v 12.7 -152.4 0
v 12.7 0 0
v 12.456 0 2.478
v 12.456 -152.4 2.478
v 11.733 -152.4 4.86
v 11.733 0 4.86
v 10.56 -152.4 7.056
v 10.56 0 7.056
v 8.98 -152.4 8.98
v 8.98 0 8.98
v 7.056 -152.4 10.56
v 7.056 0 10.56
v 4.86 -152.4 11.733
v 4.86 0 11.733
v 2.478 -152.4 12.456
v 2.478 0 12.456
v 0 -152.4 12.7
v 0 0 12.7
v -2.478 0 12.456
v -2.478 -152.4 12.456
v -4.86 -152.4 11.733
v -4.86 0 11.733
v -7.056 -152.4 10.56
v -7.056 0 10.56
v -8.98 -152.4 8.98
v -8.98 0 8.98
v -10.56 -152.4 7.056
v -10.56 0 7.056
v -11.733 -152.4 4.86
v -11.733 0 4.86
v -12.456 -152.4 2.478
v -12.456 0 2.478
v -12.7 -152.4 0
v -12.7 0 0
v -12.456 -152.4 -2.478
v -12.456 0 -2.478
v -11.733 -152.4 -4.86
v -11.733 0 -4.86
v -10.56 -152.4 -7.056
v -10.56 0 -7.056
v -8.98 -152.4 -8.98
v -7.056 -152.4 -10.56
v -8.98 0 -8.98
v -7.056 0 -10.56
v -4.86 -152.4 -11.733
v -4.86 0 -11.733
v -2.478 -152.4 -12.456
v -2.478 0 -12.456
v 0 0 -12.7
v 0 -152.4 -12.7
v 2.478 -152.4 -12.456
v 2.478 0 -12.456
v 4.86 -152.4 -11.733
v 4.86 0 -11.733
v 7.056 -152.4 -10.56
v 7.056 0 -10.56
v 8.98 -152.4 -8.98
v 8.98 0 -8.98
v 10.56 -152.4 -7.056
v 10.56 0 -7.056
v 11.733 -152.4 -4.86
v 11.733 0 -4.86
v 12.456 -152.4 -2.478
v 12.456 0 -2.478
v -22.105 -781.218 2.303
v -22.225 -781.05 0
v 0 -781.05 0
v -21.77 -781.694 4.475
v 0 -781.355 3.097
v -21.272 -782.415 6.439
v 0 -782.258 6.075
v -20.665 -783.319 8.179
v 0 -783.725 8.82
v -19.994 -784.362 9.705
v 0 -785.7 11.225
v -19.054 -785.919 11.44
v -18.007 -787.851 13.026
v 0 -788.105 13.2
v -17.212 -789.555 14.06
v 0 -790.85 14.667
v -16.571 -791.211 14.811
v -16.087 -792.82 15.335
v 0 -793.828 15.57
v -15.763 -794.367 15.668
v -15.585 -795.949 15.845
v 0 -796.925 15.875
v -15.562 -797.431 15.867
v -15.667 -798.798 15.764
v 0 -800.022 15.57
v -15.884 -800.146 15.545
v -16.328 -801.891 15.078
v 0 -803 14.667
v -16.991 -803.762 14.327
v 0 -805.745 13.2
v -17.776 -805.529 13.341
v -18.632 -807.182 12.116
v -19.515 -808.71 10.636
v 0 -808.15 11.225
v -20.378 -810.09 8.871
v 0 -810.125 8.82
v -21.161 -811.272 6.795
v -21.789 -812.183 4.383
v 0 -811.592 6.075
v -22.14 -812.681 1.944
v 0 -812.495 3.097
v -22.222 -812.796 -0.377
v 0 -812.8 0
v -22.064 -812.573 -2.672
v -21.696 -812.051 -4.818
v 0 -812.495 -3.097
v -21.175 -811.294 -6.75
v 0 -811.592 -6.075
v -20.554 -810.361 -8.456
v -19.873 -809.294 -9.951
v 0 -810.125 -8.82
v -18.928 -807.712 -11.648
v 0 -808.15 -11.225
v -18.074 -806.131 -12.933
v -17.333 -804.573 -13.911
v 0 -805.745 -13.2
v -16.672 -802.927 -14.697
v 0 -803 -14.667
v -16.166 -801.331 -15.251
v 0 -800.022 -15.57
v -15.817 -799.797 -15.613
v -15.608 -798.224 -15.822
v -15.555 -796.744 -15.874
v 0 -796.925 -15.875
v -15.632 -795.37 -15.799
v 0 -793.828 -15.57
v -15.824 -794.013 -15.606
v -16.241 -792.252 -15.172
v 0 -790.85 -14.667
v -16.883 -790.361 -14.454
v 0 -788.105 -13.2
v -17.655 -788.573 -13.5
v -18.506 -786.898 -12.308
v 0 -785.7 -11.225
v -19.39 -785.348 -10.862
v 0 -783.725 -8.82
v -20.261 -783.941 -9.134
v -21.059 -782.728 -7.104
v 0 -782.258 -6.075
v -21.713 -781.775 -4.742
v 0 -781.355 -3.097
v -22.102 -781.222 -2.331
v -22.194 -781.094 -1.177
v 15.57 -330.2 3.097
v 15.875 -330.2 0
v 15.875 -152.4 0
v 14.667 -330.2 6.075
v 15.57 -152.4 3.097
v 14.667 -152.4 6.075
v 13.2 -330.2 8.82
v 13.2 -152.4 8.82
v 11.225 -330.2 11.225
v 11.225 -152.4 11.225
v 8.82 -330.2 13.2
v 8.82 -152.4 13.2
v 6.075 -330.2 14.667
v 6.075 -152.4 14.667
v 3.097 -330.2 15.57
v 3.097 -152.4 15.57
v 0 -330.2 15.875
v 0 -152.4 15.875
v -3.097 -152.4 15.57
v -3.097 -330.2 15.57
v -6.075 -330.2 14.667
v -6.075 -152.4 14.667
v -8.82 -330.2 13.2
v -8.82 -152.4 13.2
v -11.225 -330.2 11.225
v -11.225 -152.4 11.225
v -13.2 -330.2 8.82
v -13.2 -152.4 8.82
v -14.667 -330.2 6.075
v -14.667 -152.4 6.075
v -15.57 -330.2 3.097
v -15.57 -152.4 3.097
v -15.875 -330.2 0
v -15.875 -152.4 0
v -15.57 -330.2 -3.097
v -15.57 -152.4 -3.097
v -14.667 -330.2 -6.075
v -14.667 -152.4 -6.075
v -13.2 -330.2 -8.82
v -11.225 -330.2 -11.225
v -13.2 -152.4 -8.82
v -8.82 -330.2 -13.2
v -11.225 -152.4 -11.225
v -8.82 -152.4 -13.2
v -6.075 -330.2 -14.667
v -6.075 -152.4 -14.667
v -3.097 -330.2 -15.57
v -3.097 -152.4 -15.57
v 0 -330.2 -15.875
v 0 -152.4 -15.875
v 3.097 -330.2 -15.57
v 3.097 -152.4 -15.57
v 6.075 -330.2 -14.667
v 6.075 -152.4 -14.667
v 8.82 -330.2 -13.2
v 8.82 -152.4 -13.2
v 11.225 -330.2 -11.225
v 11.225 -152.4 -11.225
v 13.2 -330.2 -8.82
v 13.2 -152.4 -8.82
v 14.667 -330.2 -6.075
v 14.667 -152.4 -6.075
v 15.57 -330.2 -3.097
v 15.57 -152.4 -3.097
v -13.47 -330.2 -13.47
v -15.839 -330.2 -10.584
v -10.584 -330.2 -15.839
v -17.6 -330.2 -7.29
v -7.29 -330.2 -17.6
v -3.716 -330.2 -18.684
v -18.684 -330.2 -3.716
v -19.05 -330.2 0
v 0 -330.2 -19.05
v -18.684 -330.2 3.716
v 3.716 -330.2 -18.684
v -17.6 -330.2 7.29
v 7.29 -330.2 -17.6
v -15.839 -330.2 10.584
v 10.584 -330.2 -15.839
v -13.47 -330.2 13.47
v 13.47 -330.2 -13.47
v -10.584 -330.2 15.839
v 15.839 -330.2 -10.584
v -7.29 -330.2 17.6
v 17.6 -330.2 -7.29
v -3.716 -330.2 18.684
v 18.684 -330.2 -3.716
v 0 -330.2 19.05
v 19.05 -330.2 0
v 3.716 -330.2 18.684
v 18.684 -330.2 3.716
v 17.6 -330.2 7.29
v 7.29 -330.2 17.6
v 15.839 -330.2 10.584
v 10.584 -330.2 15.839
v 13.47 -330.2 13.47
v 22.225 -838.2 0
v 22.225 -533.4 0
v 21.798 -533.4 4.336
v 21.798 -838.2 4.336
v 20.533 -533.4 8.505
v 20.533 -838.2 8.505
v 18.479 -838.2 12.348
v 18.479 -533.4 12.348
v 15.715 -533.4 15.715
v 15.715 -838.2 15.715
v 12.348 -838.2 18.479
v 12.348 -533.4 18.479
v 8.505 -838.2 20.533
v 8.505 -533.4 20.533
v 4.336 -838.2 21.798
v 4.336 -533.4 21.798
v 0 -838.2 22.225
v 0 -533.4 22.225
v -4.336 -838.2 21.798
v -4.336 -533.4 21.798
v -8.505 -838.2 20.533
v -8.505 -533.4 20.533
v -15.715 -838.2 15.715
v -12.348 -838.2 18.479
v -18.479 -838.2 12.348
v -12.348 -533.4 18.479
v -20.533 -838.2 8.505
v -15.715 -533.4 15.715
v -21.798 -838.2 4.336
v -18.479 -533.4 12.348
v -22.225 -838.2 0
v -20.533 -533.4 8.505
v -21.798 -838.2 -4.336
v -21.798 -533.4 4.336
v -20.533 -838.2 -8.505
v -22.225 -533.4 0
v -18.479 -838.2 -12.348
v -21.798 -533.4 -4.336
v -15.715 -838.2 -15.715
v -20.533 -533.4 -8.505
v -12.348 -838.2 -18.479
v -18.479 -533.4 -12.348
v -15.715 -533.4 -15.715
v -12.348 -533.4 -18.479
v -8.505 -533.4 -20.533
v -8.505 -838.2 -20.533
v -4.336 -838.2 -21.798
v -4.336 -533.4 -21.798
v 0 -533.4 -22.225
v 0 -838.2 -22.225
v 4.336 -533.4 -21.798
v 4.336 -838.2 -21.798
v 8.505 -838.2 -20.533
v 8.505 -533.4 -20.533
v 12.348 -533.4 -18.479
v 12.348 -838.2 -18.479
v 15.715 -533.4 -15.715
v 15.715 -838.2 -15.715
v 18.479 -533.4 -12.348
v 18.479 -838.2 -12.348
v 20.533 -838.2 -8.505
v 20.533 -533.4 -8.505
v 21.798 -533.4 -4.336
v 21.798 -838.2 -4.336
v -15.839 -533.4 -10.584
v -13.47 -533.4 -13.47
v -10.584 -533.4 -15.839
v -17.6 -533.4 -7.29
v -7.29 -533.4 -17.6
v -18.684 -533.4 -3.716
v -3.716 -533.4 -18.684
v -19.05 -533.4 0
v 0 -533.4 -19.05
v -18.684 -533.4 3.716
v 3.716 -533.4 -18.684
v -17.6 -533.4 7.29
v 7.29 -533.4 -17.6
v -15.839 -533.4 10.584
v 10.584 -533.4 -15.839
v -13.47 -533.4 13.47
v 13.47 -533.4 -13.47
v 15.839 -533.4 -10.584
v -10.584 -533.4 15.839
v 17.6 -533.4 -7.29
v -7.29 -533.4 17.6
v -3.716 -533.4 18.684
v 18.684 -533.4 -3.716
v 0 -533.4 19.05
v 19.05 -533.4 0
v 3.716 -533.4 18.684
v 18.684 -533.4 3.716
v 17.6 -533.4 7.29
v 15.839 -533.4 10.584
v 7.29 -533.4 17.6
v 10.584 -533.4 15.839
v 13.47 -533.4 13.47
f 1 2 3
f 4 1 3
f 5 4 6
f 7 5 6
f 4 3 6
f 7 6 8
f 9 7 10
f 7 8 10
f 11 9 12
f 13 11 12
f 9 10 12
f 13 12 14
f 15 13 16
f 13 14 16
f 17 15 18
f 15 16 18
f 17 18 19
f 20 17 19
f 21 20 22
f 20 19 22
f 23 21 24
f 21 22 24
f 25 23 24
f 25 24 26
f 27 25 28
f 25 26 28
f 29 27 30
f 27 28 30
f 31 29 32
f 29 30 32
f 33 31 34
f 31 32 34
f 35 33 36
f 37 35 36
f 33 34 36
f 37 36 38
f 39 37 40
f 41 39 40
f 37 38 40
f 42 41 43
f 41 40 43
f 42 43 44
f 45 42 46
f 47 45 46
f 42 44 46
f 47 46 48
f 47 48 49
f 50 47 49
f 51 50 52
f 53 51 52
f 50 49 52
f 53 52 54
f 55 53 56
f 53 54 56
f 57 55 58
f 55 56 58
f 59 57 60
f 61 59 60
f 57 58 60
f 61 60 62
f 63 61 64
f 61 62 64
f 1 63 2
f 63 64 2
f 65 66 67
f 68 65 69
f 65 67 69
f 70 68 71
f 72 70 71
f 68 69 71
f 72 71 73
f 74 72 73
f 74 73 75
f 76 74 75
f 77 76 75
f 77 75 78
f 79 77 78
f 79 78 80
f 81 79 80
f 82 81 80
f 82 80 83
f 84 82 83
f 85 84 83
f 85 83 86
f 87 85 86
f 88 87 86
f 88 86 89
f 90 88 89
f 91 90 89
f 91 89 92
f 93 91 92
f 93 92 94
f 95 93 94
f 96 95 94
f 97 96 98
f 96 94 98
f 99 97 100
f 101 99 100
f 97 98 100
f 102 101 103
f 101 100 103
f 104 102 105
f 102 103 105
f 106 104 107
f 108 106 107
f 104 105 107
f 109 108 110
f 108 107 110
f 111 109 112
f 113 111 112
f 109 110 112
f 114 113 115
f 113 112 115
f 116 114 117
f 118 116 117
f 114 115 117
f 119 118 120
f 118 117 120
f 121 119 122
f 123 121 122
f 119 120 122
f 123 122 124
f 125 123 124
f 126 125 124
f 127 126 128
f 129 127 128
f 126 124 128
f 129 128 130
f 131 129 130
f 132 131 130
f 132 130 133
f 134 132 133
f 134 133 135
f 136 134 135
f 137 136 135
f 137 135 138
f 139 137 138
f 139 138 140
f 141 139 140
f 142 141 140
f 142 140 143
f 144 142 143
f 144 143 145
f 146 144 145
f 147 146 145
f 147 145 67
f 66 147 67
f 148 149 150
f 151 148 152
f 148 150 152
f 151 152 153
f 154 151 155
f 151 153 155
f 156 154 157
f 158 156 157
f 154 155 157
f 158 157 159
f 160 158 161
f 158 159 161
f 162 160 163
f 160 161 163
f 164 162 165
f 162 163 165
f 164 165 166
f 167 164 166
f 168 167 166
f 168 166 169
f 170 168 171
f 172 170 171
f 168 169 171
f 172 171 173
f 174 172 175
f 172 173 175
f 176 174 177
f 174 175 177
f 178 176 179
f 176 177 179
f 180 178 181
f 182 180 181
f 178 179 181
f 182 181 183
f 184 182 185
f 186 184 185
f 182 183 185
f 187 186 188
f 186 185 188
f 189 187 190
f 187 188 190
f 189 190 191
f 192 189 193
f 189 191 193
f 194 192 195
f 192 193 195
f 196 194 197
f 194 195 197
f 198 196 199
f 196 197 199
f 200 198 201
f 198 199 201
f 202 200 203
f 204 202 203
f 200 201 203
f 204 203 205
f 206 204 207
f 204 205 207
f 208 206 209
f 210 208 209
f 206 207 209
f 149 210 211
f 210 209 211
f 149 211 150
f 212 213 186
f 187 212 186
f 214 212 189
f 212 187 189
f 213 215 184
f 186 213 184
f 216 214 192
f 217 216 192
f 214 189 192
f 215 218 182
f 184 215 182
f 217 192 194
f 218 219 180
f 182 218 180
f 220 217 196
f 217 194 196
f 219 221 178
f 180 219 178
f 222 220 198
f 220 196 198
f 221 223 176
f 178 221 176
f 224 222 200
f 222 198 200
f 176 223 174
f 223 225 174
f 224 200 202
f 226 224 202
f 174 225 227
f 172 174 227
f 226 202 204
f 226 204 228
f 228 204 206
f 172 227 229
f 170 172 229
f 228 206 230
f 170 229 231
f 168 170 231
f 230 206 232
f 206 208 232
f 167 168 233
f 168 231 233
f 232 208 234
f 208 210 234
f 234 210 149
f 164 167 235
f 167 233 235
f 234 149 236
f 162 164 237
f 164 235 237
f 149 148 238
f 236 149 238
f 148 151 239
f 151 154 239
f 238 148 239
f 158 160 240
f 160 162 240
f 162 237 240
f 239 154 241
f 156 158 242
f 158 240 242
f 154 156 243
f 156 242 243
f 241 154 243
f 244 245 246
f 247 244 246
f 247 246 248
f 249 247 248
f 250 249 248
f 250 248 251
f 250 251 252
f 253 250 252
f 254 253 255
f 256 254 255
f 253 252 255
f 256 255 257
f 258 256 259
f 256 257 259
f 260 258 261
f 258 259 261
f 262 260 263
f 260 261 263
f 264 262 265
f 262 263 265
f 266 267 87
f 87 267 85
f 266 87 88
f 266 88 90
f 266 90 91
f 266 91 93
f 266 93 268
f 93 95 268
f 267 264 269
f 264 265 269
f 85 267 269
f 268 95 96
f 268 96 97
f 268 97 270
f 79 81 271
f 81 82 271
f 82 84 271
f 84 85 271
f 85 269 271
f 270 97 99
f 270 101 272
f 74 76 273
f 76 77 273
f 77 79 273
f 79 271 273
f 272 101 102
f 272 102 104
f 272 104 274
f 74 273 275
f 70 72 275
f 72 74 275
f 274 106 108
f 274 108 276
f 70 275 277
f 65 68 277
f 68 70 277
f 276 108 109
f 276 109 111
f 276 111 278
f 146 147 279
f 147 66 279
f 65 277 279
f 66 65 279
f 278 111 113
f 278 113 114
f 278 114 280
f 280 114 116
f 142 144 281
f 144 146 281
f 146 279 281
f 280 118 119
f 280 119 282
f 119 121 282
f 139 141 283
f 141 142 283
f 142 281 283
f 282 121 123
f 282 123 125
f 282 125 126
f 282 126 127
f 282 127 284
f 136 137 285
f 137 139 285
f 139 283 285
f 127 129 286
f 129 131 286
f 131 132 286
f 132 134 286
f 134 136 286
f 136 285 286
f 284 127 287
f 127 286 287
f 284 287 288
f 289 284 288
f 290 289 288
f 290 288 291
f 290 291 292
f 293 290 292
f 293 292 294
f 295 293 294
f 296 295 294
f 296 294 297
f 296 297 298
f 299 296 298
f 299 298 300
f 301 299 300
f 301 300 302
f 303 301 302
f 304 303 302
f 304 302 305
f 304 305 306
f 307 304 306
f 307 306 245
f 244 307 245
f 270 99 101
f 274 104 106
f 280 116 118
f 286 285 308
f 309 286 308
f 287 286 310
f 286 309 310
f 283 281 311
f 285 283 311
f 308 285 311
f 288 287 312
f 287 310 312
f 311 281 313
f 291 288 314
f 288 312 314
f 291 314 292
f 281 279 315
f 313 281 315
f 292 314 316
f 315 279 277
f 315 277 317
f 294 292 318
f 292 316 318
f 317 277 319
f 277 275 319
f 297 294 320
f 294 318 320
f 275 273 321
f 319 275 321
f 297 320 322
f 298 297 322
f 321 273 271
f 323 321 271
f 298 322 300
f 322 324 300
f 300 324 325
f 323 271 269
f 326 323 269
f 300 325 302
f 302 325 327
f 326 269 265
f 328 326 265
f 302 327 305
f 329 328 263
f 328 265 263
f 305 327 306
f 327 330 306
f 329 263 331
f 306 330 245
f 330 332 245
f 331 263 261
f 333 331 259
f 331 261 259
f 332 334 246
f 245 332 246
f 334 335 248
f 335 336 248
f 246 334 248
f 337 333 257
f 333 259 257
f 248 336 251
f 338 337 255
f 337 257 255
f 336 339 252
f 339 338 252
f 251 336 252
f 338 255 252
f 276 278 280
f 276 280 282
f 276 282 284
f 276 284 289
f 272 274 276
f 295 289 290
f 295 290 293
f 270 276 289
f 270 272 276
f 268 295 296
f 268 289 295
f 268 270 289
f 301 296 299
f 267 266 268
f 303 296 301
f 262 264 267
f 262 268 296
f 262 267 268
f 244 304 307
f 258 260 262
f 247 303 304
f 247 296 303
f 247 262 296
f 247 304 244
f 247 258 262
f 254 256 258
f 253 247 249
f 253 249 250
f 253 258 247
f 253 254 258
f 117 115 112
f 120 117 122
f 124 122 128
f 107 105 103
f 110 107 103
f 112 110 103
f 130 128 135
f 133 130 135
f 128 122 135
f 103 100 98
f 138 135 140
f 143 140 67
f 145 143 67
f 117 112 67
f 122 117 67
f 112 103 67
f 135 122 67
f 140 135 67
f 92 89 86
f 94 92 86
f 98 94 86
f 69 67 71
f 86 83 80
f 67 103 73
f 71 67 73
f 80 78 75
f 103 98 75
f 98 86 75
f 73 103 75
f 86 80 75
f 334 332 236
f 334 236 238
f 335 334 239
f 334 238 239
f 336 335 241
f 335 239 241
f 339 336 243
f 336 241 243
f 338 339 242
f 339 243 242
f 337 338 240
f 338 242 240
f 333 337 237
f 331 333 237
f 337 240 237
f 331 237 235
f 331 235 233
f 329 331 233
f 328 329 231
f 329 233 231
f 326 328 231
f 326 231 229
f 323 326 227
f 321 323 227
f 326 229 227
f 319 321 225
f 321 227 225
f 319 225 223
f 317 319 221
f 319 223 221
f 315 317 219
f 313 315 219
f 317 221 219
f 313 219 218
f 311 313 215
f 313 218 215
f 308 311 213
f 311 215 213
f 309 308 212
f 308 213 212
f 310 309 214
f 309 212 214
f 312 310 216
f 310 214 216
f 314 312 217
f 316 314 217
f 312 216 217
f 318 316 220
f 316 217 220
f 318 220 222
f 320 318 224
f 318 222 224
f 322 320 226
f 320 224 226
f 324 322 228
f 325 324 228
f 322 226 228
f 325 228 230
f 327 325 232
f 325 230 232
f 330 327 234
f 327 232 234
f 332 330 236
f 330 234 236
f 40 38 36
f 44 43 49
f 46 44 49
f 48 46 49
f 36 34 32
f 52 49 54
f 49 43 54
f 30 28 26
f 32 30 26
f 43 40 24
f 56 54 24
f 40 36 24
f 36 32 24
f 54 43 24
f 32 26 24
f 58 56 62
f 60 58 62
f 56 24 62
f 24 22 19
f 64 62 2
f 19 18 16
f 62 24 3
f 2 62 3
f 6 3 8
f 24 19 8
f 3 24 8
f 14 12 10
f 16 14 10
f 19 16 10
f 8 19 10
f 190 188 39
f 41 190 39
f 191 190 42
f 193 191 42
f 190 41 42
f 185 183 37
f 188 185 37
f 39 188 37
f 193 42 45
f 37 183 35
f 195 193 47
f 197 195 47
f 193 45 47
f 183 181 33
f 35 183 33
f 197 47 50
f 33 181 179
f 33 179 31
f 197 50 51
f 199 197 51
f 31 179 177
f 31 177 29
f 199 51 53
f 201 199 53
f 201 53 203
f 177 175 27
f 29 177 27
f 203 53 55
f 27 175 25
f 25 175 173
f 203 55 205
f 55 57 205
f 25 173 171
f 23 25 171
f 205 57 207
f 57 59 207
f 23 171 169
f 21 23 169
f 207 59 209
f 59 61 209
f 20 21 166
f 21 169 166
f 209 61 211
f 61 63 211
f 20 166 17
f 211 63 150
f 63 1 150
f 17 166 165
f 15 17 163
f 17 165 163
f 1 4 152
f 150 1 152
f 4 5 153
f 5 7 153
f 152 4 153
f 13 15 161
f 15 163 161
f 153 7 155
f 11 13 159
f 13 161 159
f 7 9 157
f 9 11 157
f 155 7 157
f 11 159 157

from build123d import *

# Parameters (mm, degrees)
F0_R     = 12.7
F1_DEPTH = 152.4
F2_R     = 15.875
F2_R_2   = 12.7
F3_DEPTH = 177.8
F4_R     = 19.05
F4_R_2   = 15.875
F5_DEPTH = 203.2
F6_R     = 22.225
F6_R_2   = 19.05
F7_DEPTH = 304.8
F8_R     = 15.875
F9_DEPTH = 25.4


with BuildPart() as f1:
    # F0 (on Front) → F1 (new body)
    with BuildSketch(Plane.XZ):
        Circle(F0_R)
    extrude(amount=F1_DEPTH)

    # F2 (on face) → F3 (join)
    with BuildSketch(Plane.XZ.offset(152.4)):
        Circle(F2_R)
        Circle(F2_R_2, mode=Mode.SUBTRACT)
        Circle(F2_R_2)
    extrude(amount=F3_DEPTH)

    # F4 (on face) → F5 (join)
    with BuildSketch(Plane.XZ.offset(330.2)):
        Circle(F4_R)
        Circle(F4_R_2, mode=Mode.SUBTRACT)
        Circle(F4_R_2)
    extrude(amount=F5_DEPTH)

    # F6 (on face) → F7 (join)
    with BuildSketch(Plane.XZ.offset(533.4)):
        Circle(F6_R)
        Circle(F6_R_2, mode=Mode.SUBTRACT)
        Circle(F6_R_2)
    extrude(amount=F7_DEPTH)

    # F8 (on Right) → F9 (cut)
    with BuildSketch(Plane.YZ):
        with Locations((-796.925, 0)):
            Circle(F8_R)
    extrude(amount=-F9_DEPTH, mode=Mode.SUBTRACT)


solid = f1.part
